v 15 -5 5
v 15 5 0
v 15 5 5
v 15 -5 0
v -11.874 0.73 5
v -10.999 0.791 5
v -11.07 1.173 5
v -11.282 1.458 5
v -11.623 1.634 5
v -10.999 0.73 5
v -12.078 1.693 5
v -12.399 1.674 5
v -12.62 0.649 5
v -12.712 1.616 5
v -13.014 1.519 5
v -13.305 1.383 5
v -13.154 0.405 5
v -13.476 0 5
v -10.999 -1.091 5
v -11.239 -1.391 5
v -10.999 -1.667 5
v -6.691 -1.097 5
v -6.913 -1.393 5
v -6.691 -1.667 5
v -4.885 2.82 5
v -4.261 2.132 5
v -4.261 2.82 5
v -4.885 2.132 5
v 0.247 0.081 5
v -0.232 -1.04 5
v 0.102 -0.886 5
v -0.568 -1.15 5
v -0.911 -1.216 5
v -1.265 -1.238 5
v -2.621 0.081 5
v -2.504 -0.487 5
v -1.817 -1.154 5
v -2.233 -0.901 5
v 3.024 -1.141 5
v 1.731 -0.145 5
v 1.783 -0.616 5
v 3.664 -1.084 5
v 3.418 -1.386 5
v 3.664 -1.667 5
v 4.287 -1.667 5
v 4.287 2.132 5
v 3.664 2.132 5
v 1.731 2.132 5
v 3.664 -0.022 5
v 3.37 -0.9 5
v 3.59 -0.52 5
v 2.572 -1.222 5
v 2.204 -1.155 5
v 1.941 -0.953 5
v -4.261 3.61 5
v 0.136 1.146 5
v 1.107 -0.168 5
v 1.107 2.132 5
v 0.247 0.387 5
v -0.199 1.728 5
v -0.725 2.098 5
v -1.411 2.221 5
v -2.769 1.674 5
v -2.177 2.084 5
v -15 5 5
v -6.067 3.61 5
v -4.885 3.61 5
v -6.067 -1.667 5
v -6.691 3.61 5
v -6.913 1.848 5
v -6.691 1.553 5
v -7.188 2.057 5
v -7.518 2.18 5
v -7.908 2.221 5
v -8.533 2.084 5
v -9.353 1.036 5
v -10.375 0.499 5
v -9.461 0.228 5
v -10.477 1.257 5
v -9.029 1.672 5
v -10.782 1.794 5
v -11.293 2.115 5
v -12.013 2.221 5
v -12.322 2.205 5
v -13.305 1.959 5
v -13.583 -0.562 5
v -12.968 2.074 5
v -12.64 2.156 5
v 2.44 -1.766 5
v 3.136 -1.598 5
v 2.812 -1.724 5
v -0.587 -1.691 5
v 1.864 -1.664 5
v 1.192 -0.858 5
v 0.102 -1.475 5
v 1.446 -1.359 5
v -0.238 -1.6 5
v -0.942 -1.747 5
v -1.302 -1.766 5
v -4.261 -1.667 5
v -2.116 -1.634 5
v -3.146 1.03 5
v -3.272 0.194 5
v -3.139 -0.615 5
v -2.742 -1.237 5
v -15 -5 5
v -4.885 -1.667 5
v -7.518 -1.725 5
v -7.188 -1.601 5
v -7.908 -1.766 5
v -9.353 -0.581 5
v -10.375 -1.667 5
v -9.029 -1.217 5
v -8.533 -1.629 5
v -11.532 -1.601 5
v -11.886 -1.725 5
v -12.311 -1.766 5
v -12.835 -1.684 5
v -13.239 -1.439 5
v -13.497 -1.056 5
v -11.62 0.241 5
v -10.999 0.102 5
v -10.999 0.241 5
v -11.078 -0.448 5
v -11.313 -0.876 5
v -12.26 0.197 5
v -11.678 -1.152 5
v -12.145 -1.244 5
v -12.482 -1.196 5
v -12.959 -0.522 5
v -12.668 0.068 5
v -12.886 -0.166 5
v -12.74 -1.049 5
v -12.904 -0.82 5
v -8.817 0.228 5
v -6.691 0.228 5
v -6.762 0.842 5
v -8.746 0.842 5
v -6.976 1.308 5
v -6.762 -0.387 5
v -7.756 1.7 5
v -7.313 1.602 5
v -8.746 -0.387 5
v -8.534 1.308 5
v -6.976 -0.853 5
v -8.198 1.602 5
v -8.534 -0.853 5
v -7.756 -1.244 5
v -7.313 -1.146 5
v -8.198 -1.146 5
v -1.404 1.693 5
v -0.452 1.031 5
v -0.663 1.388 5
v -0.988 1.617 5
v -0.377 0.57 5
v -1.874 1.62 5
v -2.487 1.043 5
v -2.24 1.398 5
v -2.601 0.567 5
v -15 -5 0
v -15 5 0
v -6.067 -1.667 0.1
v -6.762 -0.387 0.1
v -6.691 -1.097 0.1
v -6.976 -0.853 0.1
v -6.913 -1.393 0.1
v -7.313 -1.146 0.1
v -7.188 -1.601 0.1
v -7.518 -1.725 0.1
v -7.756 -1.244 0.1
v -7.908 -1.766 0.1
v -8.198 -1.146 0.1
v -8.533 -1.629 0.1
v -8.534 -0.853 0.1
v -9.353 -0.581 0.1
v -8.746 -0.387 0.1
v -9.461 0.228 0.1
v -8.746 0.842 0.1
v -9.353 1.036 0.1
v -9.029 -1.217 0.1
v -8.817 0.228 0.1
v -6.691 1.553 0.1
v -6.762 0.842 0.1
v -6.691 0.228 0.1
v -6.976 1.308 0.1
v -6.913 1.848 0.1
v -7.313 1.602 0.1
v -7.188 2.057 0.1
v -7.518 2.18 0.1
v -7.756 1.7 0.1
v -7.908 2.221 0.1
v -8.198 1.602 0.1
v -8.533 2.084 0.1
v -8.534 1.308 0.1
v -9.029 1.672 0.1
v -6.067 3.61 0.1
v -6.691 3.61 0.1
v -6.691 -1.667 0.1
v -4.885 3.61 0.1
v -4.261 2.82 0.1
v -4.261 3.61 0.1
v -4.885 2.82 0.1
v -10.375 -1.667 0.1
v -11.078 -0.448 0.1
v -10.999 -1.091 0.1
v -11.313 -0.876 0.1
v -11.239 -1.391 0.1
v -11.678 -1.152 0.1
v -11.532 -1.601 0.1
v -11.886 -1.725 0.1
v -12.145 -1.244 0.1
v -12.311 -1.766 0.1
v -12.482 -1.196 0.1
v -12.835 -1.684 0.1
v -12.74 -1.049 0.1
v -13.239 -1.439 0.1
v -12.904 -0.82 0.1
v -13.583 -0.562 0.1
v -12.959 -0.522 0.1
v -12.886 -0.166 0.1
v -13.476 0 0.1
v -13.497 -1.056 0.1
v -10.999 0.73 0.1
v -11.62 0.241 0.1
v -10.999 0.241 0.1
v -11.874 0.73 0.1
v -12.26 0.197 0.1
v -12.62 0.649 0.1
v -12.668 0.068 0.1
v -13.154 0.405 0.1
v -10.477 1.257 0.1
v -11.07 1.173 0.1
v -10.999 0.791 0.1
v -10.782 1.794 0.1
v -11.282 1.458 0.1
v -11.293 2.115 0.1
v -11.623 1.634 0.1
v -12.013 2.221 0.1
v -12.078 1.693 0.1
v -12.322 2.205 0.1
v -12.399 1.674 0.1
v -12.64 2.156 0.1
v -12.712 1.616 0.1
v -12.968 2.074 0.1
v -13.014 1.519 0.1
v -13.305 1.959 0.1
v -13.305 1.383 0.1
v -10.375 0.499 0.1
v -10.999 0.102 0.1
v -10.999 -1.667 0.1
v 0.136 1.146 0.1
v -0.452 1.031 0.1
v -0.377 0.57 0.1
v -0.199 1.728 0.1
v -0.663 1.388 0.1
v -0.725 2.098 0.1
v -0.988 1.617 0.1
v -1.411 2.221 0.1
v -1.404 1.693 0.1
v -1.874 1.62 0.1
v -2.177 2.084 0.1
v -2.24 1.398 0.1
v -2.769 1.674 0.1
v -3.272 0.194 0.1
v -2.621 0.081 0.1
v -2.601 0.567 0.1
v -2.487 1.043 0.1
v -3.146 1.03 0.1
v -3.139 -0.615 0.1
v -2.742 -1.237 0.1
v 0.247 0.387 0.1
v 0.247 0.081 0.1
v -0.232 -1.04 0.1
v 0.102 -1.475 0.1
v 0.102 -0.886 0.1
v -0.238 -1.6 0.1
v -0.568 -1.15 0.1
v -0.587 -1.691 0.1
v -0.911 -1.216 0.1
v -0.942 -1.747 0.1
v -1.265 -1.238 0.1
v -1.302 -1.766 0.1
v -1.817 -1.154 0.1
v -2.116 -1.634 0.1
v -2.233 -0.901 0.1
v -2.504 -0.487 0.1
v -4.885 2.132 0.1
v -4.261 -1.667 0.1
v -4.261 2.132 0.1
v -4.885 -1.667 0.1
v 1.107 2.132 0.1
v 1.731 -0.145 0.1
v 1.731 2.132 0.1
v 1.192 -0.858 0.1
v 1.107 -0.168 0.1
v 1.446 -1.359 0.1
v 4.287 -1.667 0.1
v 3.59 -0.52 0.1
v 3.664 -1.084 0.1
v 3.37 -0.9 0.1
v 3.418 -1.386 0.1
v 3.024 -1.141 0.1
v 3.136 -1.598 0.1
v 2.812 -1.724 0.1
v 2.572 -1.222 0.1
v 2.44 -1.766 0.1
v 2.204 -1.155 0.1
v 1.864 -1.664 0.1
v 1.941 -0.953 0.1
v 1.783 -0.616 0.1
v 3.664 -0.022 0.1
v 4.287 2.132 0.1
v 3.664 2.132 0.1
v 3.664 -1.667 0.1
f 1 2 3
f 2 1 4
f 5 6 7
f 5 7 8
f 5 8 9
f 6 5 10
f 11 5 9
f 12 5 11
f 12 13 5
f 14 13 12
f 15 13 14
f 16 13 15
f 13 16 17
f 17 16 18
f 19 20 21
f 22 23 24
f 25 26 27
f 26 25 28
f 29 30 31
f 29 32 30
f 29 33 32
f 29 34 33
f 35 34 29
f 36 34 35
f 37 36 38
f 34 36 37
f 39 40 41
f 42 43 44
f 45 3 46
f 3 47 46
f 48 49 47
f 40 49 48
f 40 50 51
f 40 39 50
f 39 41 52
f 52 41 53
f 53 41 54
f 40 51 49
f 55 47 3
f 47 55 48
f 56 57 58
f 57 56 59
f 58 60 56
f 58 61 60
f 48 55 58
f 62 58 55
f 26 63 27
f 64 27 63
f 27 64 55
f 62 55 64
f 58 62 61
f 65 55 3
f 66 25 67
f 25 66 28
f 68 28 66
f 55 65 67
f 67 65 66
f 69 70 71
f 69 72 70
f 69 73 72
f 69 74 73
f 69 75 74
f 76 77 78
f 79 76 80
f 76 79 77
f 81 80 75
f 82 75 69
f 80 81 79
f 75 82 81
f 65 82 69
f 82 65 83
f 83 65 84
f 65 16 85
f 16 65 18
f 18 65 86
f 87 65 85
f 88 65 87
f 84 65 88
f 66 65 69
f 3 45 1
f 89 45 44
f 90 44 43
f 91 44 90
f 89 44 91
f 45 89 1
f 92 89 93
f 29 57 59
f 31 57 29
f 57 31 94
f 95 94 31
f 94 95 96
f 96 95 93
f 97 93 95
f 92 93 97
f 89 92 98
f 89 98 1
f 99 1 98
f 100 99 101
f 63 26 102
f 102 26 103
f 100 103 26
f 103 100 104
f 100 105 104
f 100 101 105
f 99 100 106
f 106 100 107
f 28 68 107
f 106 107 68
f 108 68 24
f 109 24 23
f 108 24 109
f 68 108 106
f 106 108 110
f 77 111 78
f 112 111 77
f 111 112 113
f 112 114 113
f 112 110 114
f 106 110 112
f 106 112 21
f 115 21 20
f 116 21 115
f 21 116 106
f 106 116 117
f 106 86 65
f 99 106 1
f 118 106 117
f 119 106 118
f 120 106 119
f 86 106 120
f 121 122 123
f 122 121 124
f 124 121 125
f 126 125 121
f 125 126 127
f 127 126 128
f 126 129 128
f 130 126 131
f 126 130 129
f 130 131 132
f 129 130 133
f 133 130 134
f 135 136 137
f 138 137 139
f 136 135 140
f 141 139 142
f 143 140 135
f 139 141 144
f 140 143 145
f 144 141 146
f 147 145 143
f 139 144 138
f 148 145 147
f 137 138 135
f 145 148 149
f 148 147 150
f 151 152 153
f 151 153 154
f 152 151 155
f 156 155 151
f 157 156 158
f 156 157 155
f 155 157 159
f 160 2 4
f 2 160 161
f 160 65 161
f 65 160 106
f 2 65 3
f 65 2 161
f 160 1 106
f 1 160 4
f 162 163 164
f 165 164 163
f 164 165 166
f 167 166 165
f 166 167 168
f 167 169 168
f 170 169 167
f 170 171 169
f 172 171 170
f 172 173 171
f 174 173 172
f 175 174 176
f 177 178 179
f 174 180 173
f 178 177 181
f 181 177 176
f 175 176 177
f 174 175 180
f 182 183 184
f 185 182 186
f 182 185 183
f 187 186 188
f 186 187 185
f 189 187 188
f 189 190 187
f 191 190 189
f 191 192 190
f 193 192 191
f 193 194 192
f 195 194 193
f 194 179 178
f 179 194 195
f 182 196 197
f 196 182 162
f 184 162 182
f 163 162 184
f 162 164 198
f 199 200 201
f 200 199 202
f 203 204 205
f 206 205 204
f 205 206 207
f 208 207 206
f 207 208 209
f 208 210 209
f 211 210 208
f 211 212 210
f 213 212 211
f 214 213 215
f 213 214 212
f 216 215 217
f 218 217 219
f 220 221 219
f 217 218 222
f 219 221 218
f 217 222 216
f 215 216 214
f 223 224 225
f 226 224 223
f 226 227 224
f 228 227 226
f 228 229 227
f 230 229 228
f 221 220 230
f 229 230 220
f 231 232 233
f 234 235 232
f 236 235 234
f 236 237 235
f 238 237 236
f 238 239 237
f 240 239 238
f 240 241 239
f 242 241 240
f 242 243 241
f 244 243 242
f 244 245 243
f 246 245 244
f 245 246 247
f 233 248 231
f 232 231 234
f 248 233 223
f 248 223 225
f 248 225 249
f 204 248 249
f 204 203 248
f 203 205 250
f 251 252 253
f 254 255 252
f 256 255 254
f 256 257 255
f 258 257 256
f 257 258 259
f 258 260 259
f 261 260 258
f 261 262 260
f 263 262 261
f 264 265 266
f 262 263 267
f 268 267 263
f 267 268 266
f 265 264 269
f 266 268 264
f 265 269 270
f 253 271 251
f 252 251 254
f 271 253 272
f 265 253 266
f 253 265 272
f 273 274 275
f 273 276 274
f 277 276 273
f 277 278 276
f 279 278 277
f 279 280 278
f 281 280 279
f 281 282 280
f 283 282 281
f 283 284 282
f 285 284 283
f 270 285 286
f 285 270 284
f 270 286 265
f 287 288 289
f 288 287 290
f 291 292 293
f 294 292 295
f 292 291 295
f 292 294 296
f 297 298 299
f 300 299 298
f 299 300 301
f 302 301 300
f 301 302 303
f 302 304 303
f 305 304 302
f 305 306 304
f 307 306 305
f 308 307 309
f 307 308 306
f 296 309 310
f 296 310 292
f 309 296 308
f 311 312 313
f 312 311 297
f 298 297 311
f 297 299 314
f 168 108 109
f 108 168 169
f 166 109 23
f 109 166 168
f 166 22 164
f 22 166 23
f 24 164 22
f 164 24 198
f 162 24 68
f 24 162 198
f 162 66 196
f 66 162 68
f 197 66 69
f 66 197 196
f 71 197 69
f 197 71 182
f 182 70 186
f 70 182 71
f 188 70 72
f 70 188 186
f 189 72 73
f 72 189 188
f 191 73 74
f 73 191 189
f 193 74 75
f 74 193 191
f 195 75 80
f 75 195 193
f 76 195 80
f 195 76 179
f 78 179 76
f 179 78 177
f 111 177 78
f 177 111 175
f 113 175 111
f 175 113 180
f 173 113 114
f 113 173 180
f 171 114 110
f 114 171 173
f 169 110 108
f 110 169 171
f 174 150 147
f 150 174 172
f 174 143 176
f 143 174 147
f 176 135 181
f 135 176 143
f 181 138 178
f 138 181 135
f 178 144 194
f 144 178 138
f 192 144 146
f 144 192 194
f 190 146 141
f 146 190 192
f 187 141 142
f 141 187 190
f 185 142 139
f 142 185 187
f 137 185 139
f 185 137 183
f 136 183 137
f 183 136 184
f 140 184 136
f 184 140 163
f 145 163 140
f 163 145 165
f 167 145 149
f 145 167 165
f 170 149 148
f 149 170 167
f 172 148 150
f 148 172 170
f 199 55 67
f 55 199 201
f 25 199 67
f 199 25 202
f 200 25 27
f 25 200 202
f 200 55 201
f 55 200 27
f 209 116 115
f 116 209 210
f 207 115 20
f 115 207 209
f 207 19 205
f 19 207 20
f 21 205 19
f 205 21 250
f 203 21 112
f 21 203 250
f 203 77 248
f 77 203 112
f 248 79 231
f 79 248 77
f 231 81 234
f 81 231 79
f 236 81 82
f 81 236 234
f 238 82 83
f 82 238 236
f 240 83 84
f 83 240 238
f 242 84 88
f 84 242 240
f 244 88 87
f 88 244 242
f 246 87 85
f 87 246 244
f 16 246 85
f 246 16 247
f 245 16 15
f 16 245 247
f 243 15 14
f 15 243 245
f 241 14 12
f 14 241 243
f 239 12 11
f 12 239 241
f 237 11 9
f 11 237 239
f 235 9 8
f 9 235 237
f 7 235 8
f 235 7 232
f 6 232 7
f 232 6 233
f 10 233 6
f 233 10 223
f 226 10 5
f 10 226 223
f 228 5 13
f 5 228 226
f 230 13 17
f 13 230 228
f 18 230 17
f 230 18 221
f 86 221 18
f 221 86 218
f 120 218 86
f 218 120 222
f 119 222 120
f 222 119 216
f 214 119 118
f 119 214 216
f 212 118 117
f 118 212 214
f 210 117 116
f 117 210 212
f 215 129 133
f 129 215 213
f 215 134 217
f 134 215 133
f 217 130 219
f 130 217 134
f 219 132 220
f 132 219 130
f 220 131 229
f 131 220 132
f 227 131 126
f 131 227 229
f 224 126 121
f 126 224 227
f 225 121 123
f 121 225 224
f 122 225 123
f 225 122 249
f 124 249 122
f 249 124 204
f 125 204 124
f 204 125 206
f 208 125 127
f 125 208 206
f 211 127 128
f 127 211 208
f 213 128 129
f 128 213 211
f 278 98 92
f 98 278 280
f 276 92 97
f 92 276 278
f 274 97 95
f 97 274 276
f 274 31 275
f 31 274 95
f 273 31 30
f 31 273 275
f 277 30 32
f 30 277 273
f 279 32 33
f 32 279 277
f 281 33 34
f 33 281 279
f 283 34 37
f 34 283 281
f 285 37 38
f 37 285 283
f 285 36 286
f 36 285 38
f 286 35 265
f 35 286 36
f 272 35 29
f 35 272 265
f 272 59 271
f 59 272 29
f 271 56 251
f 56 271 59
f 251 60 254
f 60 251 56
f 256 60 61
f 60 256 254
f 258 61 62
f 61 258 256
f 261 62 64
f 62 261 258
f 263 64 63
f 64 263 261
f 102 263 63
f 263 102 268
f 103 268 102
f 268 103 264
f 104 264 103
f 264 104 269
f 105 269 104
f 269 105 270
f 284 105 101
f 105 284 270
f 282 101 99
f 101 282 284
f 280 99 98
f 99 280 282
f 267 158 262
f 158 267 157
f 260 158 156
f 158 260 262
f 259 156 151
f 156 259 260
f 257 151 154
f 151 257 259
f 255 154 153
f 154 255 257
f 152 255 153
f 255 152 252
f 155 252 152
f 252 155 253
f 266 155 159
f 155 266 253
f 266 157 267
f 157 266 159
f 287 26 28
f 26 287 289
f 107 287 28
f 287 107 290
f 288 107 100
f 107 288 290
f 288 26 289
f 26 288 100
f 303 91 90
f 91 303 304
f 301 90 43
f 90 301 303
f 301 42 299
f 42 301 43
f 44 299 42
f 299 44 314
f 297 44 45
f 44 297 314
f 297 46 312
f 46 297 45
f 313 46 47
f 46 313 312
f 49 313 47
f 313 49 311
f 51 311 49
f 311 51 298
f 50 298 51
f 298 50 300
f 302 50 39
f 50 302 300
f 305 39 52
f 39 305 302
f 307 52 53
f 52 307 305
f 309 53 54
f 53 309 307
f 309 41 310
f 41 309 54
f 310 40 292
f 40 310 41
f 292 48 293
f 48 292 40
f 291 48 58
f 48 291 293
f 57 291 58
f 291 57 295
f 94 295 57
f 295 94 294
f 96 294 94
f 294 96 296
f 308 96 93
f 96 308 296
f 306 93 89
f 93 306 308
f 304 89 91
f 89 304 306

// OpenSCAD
$fn = 3; 
texte_a_inserer = "adieu"; 
taille = 5; 
police = "DejaVuSans"; //[[Abril Fatface,Aclonica,Acme,Advent Pro,Akronim,Aladin,Alegreya,Alegreya Sans,Alegreya SC,Alex Brush,Alfa Slab One,Alice,Amaranth,Architects Daughter,Archivo Black,Archivo Narrow,Arimo,Arvo,Asap,Astloch,Asul,Averia Libre,Averia Serif Libre,Bangers,Basic,Belgrano,Berkshire Swash,Bigshot One,Bilbo Swash Caps,Black Ops One,Bonbon,Bowlby One SC,Brawler,Bubblegum Sans,Butterfly Kids,Cabin Condensed,Caesar Dressing,Cagliostro,Calligraffitti,Capriola,Carter One,Changa One,Chango,Chelsea Market,Cherry Cream Soda,Chewy,Chicle,Chivo,Clicker Script,Coming Soon,Concert One,Condiment,Cookie,Courgette,Covered By Your Grace,Crimson Text,Dancing Script,DejaVu Sans,DejaVu Serif,Dhurjati,Doppio One,Dosis,Droid Sans,Eagle Lake,Electrolize,Emilys Candy,Encode Sans,Encode Sans Compressed,Euphoria Script,Exo,Exo 2,Faster One,Federo,Finger Paint,Fjord One,Fontdiner Swanky,Freckle Face,Fruktur,Gabriela,Geo,Germania One,Give You Glory,Gloria Hallelujah,Goudy Bookletter 1911,Graduate,Grand Hotel,Great Vibes,Griffy,Hanalei Fill,Happy Monkey,Henny Penny,Hind,IM Fell English SC,Indie Flower,Irish Grover,Italianno,Jacques Francois Shadow,Jolly Lodger,Josefin Slab,Joti One,Judson,Just Another Hand,Kalam,Kameron,Karma,Kavoon,Knewave,Kranky,Kristi,Laila,Lakki Reddy,Lancelot,Lato,Leckerli One,Ledger,Lekton,Lemon One,Liberation Sans,Libre Caslon Text,Life Savers,Lilita One,Lily Script One,Limelight,Lobster,Lobster Two,Londrina Outline,Londrina Shadow,Londrina Solid,Lora,Love Ya Like A Sister,Loved by the King,Lovers Quarrel,Luckiest Guy,Lusitana,Macondo,Macondo Swash Caps,Mako,Marck Script,Margarine,Marko One,Maven Pro,McLaren,MedievalSharp,Merienda One,Merriweather,Mervale Script,Metal Mania,Metrophobic,Milonga,Miltonian Tattoo,Miss Fajardose,Molle,Montez,Montserrat,Mr De Haviland,Mystery Quest,Neucha,New Rocker,Niconne,Nosifer,Nothing You Could Do,Noto Sans Oriya,Noto Serif,Nova Square,Nunito,Old Standard TT,Oleo Script,Oleo Script Swash Caps,Orbitron,Oregano,Orienta,Original Surfer,Oswald,Over the Rainbow,Overlock,Oxygen,Pacifico,Paprika,Parisienne,Patrick Hand SC,Paytone One,Peralta,Permanent Marker,Piedra,Pirata One,Play,Playball,Poetsen One,Poppins,Press Start 2P,Princess Sofia,PT Mono,Qwigley,Racing Sans One,Raleway,Rancho,Ranga,Ribeye,Roboto,Roboto Condensed,Roboto Slab,Rochester,Rock Salt,Rubik One,Sail,Salsa,Sansita One,Sarina,Satisfy,Schoolbell,Seaweed Script,Sevillana,Shadows Into Light,Shadows Into Light Two,Share,Six Caps,Skranji,Source Sans Pro,Spicy Rice,Stardos Stencil,Stoke,Syncopate,Teko,Terminal Dosis,The Girl Next Door,Tillana,Timmana,Titillium Web,Ubuntu,Ultra,Underdog,UnifrakturCook,UnifrakturMaguntia,Vampiro One,Vidaloka,Viga,Voces,Volkhov,Vollkorn,Voltaire,Waiting for the Sunrise,Wallpoet,Wellfleet,Wendy One,Yellowtail,Yesteryear,Zeyada]]
hauteur = 5; 
longueur_cube = 30; 
largeur_cube = 10; 
hauteur_cube = 5; 
relief_extrusion = "extru"; //[relief,extru]
module rendu(){
linear_extrude(hauteur) text(texte_a_inserer,size = taille, font = police);
}
module finao(){
if ( relief_extrusion == "relief") {
   union(){
 translate([0,0,0])   cube([longueur_cube,largeur_cube,hauteur_cube]);
translate([1,(largeur_cube/3),hauteur_cube]) rendu();
   } 
}
else
{
difference(){
 translate([0,0,0])   cube([longueur_cube,largeur_cube,hauteur_cube]);
translate([1,(largeur_cube/3),(hauteur_cube -hauteur+0.1)]) rendu();
}
 }
}
translate ([-(longueur_cube/2),-(largeur_cube/2),0]) finao();
